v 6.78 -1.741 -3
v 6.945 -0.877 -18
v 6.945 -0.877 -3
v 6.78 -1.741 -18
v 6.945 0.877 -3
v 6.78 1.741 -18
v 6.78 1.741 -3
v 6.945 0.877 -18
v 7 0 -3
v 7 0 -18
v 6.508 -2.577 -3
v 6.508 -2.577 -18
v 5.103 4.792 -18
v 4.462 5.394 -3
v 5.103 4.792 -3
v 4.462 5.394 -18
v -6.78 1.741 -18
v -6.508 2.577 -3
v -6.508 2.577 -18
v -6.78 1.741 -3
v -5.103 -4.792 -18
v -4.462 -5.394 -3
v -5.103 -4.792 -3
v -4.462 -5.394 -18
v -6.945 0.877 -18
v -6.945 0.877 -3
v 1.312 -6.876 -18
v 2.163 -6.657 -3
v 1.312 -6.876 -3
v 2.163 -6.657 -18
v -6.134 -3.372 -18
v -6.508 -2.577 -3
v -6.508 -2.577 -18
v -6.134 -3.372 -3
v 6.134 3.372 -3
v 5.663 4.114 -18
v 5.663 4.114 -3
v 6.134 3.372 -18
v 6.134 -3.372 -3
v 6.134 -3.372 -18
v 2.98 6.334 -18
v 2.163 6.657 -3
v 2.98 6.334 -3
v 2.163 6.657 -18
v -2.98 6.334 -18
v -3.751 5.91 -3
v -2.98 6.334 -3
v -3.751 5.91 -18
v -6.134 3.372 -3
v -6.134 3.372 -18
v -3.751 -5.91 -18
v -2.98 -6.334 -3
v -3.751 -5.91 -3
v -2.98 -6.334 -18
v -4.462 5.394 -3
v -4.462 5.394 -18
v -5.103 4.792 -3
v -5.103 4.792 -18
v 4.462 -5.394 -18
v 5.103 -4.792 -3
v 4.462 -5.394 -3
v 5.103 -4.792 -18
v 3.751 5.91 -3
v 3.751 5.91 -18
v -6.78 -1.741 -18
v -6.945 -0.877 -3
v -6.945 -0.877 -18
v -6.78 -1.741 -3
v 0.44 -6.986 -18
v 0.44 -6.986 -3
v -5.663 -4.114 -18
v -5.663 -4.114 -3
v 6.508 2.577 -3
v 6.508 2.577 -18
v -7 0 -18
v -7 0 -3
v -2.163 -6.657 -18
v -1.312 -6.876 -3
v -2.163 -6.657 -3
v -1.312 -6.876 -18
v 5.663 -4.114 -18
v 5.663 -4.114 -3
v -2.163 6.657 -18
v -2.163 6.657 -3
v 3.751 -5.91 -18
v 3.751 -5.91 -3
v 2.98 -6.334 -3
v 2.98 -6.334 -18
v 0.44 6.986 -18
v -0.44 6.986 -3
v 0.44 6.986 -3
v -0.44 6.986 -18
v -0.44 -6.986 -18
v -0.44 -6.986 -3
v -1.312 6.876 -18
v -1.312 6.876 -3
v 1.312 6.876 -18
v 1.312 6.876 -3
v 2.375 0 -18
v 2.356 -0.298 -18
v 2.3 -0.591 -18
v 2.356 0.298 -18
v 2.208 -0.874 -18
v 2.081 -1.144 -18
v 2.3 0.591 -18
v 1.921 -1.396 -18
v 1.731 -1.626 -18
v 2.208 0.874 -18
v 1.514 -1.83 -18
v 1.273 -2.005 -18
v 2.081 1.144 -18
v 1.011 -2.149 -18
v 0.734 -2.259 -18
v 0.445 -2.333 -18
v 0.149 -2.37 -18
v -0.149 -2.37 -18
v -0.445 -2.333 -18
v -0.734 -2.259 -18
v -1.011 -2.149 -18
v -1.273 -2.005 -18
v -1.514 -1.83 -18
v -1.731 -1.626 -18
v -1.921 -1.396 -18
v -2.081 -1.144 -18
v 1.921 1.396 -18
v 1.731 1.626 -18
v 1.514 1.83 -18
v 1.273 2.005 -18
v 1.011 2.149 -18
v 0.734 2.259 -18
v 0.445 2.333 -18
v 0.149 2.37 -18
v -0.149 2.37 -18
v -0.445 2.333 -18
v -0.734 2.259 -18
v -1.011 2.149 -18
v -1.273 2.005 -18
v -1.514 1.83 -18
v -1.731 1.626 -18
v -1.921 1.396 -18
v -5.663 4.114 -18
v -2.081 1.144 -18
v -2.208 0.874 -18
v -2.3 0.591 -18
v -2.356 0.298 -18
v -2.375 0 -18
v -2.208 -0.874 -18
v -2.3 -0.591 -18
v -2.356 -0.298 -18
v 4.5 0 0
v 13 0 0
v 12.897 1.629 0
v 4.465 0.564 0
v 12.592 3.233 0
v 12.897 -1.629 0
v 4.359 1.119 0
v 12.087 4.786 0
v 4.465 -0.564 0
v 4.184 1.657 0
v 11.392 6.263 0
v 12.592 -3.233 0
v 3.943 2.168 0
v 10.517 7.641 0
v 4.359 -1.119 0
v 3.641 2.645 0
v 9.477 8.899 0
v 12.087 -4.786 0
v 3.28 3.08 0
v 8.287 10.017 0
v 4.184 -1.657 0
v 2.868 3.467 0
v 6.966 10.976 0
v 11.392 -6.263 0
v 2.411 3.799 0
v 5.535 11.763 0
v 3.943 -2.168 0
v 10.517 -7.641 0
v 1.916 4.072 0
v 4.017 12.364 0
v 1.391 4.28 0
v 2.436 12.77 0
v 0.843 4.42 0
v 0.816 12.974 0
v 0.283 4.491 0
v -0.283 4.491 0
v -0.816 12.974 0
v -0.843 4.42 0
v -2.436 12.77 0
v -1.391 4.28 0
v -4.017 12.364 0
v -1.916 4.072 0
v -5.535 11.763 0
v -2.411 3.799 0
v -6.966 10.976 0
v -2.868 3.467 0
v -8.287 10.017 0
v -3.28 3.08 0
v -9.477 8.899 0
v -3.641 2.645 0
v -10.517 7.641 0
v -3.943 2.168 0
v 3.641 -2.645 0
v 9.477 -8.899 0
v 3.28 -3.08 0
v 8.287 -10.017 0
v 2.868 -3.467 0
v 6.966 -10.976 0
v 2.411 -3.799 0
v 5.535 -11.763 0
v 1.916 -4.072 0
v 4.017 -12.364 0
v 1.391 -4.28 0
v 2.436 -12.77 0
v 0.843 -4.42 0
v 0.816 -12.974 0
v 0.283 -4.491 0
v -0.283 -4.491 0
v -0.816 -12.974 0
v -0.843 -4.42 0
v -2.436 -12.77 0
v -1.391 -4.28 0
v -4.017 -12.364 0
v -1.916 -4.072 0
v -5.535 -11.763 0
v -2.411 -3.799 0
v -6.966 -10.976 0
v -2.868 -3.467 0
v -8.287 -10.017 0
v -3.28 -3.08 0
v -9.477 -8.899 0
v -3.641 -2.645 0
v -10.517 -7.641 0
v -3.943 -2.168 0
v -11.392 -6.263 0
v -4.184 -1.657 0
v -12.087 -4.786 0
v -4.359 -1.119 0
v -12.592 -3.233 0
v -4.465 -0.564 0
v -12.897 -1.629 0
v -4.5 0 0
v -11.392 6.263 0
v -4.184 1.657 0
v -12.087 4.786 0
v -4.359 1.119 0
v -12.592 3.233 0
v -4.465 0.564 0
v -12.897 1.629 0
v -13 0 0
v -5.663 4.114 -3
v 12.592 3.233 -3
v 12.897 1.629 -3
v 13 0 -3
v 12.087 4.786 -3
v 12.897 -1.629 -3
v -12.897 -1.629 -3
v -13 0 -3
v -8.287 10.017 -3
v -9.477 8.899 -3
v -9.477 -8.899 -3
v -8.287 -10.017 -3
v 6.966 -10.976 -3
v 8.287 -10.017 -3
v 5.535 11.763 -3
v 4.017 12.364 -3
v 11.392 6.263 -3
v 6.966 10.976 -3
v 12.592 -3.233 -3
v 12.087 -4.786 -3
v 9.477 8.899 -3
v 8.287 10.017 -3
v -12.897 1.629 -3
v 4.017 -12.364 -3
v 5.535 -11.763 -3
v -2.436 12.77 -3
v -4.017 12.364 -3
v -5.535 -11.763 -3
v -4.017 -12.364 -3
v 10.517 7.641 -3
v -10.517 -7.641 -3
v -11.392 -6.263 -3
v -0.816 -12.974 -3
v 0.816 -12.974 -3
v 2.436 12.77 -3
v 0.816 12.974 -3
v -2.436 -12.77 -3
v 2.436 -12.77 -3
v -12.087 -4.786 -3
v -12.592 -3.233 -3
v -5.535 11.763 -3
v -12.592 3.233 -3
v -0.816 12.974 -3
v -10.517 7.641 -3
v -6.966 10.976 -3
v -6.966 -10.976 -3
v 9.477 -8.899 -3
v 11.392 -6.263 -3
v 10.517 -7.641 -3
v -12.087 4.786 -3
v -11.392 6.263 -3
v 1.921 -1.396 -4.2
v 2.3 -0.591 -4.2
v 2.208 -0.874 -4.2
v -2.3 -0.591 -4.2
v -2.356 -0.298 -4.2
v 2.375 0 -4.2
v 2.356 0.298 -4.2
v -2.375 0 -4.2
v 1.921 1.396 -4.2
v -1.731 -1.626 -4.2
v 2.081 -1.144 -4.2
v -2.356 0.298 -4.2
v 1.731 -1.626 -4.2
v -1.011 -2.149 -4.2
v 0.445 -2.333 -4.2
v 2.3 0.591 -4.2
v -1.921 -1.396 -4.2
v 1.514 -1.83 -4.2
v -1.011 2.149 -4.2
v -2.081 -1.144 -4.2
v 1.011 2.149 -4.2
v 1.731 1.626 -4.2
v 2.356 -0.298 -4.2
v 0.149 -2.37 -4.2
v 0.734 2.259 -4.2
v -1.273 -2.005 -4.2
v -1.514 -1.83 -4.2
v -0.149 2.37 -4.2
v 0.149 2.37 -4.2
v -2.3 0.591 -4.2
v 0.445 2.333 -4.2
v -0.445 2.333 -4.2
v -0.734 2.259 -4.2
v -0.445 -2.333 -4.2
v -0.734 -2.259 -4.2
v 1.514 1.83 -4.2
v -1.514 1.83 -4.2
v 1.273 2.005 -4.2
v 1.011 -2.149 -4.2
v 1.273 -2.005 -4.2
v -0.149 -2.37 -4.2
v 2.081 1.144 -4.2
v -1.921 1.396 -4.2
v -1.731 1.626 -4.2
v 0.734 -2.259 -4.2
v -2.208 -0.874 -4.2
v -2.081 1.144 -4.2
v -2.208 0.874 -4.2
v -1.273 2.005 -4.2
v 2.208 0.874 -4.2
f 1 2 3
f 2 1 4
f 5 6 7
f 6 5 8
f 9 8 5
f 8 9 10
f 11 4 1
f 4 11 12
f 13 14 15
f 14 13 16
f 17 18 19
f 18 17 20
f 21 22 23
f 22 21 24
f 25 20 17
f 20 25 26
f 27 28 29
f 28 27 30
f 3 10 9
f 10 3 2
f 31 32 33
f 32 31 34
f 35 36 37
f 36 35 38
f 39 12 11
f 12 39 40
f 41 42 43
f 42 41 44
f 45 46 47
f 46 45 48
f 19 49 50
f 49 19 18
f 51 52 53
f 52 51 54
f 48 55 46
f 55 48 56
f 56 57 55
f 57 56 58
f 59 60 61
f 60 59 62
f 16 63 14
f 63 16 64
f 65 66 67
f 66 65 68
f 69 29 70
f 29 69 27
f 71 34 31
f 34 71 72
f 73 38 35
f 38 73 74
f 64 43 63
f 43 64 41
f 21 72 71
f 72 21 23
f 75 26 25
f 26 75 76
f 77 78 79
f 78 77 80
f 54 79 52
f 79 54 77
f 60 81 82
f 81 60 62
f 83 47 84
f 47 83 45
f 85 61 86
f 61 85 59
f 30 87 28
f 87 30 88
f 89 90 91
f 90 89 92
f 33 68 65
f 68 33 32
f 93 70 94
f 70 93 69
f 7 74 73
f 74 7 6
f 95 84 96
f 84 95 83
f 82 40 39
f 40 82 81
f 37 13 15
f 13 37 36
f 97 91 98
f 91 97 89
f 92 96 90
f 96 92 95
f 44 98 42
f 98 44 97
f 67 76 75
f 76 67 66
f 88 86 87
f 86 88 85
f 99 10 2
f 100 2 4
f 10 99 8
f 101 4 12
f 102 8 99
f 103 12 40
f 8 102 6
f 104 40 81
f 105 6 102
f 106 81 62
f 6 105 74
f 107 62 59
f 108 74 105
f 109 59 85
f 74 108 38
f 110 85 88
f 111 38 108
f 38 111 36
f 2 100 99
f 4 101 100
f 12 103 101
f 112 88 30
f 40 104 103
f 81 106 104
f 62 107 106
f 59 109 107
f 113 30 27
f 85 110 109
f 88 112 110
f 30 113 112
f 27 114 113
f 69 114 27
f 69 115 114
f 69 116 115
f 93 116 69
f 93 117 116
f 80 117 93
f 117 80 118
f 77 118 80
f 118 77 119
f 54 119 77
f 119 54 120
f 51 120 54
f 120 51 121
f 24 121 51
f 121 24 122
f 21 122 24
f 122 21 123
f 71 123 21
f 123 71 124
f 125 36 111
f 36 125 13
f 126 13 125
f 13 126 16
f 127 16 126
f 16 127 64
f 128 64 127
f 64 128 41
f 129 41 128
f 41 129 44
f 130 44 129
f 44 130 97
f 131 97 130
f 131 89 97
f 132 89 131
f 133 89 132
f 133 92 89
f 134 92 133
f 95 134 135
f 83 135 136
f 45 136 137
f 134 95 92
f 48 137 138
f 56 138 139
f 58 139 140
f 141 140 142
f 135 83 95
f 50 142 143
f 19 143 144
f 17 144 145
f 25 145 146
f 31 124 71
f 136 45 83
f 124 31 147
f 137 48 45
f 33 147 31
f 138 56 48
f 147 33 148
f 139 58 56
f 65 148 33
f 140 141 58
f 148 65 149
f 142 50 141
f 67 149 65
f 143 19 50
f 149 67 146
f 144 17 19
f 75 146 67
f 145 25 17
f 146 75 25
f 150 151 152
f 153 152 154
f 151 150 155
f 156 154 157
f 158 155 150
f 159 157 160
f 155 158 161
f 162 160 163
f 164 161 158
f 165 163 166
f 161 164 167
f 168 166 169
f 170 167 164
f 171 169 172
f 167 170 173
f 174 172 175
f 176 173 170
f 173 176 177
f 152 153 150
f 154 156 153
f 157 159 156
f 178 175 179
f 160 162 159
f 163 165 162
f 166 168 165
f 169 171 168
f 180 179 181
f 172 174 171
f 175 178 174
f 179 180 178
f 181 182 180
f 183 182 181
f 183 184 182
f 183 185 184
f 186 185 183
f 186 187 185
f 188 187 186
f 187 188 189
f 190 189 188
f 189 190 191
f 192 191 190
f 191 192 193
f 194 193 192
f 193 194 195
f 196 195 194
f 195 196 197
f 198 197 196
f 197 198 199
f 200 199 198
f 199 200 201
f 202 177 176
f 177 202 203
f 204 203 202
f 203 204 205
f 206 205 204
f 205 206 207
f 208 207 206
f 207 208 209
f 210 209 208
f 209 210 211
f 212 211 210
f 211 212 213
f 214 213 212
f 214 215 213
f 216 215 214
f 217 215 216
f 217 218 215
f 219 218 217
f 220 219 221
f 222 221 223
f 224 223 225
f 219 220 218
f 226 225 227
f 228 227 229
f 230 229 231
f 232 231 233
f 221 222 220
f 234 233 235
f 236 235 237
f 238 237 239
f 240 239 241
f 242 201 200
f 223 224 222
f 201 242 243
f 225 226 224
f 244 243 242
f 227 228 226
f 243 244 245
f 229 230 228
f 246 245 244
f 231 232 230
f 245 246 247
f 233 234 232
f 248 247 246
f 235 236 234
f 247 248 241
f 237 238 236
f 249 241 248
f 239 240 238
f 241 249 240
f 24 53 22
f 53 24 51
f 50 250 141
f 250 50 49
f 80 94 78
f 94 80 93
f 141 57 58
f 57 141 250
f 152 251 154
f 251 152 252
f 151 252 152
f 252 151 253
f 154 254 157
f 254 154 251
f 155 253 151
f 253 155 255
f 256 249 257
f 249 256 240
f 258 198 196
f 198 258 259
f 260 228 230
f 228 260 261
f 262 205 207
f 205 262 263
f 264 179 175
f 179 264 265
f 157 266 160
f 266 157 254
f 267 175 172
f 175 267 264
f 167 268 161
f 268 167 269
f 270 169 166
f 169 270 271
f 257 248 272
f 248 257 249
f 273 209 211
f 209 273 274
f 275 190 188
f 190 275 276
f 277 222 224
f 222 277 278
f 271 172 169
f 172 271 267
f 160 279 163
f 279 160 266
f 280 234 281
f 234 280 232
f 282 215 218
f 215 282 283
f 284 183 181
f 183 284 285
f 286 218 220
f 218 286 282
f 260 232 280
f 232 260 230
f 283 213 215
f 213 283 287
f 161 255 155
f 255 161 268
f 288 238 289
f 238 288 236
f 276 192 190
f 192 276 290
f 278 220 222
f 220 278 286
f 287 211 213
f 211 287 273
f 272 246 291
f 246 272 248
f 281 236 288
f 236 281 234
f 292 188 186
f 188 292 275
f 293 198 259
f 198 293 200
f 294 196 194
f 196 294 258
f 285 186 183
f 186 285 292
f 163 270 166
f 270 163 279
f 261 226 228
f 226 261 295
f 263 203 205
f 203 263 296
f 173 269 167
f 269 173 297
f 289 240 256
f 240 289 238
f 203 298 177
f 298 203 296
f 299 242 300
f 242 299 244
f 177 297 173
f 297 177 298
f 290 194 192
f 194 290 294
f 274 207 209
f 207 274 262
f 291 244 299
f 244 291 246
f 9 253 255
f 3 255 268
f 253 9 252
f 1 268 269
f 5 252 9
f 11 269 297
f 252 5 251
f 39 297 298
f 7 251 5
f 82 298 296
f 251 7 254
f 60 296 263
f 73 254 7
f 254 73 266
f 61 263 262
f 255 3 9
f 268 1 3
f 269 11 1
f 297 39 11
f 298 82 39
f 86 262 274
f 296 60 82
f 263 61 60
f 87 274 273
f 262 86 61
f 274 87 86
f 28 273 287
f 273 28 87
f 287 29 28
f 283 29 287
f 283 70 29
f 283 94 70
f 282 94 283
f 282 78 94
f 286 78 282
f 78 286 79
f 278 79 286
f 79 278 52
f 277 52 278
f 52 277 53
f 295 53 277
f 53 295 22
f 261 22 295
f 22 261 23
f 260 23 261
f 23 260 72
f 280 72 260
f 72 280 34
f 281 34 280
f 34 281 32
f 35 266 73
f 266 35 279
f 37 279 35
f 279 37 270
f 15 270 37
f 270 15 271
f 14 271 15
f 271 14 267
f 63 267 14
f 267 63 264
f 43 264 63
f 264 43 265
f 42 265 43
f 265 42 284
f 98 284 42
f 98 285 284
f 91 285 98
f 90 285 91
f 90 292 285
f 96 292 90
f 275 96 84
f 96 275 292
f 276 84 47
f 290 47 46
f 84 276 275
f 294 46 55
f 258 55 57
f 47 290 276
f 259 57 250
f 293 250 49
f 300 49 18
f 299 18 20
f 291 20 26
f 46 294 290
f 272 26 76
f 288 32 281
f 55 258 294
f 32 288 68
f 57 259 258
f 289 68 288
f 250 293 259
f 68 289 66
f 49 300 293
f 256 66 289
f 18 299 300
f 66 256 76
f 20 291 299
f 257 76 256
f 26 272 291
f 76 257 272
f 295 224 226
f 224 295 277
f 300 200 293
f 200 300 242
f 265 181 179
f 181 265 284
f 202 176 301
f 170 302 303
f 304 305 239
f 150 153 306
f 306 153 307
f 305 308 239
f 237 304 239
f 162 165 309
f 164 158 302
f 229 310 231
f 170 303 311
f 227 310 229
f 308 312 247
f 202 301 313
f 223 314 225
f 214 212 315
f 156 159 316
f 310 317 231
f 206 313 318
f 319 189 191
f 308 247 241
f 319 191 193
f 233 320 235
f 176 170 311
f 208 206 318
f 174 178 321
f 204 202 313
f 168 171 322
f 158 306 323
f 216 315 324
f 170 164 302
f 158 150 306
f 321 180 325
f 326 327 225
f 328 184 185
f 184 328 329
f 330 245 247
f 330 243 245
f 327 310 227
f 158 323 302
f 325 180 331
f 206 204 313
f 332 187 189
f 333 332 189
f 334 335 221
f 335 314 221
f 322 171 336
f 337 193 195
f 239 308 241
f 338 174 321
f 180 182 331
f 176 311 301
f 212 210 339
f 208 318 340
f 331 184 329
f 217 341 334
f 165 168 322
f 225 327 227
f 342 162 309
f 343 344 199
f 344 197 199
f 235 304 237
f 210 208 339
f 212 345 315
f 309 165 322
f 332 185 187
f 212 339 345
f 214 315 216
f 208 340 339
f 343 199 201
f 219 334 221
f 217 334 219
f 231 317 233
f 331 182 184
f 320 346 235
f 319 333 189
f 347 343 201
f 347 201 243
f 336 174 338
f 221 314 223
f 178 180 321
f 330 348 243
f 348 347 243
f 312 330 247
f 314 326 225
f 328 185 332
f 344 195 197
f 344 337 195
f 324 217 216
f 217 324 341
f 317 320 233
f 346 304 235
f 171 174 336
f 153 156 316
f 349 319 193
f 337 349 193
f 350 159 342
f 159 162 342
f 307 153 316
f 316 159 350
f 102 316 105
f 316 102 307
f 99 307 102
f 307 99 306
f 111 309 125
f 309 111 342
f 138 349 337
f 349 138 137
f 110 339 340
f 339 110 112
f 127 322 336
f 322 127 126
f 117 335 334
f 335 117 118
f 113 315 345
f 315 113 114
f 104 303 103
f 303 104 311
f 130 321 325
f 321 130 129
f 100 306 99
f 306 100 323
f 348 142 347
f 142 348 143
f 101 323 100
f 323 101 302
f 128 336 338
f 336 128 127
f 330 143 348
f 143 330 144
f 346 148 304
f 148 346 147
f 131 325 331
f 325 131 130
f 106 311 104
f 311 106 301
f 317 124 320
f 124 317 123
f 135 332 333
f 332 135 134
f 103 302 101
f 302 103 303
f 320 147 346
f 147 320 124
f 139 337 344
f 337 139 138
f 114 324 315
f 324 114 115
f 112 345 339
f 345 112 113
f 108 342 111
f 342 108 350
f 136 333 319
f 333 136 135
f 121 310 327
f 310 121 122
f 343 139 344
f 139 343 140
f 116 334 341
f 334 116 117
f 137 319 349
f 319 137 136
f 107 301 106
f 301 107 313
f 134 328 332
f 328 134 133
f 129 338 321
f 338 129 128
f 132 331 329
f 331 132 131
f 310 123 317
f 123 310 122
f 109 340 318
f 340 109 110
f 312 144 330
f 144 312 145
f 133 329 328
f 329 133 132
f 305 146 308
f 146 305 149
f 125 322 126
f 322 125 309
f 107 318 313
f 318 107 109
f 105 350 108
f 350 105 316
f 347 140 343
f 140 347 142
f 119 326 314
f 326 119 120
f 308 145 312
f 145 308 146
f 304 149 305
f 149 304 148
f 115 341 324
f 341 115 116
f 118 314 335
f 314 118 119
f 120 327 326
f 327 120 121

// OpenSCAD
$fn = 50;


difference() {
	union() {
		translate(v = [0, 0, -18.0000000000]) {
			cylinder(h = 18, r = 7.0000000000);
		}
		translate(v = [0, 0, -3.0000000000]) {
			cylinder(h = 3, r = 13.0000000000);
		}
	}
	union() {
		translate(v = [0, 0, 0]) {
			rotate(a = [0, 0, 0]) {
				difference() {
					union() {
						#translate(v = [0, 0, -18.0000000000]) {
							cylinder(h = 18, r = 2.2500000000);
						}
						#translate(v = [0, 0, -4.2000000000]) {
							cylinder(h = 4.2000000000, r1 = 2.3750000000, r2 = 4.5000000000);
						}
						#translate(v = [0, 0, -18.0000000000]) {
							cylinder(h = 18, r = 2.3750000000);
						}
						#translate(v = [0, 0, -18.0000000000]) {
							cylinder(h = 18, r = 2.2500000000);
						}
					}
					union();
				}
			}
		}
	}
}
